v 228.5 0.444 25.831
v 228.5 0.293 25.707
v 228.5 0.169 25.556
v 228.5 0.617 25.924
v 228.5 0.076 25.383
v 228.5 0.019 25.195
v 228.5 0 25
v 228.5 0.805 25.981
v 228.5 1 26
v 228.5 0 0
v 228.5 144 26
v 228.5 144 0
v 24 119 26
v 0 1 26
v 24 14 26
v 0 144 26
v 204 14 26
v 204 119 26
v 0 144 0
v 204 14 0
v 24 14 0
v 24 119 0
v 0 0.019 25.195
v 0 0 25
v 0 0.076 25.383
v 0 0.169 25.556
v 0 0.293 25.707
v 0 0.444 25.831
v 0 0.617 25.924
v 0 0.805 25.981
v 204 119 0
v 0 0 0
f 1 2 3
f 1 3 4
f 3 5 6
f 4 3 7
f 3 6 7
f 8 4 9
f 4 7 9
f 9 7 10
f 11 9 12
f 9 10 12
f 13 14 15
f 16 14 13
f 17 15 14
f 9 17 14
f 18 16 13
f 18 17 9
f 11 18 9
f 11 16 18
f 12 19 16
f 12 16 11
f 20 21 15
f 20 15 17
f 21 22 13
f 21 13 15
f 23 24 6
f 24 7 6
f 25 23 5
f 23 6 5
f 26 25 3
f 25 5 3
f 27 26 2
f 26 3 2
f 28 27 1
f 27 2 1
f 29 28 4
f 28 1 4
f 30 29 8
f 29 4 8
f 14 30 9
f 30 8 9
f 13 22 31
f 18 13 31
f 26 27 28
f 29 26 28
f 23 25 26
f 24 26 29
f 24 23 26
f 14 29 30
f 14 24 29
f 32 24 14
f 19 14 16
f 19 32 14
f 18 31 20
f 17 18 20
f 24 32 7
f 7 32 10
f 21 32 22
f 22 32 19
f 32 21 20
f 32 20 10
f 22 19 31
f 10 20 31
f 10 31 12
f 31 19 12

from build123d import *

# Parameters (mm, degrees)
BOX_W        = 228.5
BOX_H        = 144
BOX_DEPTH    = 26
SKETCH001_W  = 180
SKETCH001_H  = 105
POCKET_DEPTH = 26.001
FILLET_R     = 1


with BuildPart() as part:
    # Box → Box (new body)
    with BuildSketch(Plane.XY):
        with Locations((114.25, 72)):
            Rectangle(BOX_W, BOX_H)
    extrude(amount=BOX_DEPTH)

    # Sketch001 (on Face5 of Box) → Pocket (cut, through all)
    with BuildSketch(Plane(origin=(0, 0, 0), x_dir=(1, 0, 0), z_dir=(0, 0, -1))):
        with Locations((114, -66.5)):
            Rectangle(SKETCH001_W, SKETCH001_H)
    extrude(amount=-POCKET_DEPTH, mode=Mode.SUBTRACT)

    # Fillet
    fillet_edges = [part.edges().sort_by_distance(p)[0] for p in [
        (114.25, 0, 26),
    ]]
    fillet(fillet_edges, radius=FILLET_R)


solid = part.part
